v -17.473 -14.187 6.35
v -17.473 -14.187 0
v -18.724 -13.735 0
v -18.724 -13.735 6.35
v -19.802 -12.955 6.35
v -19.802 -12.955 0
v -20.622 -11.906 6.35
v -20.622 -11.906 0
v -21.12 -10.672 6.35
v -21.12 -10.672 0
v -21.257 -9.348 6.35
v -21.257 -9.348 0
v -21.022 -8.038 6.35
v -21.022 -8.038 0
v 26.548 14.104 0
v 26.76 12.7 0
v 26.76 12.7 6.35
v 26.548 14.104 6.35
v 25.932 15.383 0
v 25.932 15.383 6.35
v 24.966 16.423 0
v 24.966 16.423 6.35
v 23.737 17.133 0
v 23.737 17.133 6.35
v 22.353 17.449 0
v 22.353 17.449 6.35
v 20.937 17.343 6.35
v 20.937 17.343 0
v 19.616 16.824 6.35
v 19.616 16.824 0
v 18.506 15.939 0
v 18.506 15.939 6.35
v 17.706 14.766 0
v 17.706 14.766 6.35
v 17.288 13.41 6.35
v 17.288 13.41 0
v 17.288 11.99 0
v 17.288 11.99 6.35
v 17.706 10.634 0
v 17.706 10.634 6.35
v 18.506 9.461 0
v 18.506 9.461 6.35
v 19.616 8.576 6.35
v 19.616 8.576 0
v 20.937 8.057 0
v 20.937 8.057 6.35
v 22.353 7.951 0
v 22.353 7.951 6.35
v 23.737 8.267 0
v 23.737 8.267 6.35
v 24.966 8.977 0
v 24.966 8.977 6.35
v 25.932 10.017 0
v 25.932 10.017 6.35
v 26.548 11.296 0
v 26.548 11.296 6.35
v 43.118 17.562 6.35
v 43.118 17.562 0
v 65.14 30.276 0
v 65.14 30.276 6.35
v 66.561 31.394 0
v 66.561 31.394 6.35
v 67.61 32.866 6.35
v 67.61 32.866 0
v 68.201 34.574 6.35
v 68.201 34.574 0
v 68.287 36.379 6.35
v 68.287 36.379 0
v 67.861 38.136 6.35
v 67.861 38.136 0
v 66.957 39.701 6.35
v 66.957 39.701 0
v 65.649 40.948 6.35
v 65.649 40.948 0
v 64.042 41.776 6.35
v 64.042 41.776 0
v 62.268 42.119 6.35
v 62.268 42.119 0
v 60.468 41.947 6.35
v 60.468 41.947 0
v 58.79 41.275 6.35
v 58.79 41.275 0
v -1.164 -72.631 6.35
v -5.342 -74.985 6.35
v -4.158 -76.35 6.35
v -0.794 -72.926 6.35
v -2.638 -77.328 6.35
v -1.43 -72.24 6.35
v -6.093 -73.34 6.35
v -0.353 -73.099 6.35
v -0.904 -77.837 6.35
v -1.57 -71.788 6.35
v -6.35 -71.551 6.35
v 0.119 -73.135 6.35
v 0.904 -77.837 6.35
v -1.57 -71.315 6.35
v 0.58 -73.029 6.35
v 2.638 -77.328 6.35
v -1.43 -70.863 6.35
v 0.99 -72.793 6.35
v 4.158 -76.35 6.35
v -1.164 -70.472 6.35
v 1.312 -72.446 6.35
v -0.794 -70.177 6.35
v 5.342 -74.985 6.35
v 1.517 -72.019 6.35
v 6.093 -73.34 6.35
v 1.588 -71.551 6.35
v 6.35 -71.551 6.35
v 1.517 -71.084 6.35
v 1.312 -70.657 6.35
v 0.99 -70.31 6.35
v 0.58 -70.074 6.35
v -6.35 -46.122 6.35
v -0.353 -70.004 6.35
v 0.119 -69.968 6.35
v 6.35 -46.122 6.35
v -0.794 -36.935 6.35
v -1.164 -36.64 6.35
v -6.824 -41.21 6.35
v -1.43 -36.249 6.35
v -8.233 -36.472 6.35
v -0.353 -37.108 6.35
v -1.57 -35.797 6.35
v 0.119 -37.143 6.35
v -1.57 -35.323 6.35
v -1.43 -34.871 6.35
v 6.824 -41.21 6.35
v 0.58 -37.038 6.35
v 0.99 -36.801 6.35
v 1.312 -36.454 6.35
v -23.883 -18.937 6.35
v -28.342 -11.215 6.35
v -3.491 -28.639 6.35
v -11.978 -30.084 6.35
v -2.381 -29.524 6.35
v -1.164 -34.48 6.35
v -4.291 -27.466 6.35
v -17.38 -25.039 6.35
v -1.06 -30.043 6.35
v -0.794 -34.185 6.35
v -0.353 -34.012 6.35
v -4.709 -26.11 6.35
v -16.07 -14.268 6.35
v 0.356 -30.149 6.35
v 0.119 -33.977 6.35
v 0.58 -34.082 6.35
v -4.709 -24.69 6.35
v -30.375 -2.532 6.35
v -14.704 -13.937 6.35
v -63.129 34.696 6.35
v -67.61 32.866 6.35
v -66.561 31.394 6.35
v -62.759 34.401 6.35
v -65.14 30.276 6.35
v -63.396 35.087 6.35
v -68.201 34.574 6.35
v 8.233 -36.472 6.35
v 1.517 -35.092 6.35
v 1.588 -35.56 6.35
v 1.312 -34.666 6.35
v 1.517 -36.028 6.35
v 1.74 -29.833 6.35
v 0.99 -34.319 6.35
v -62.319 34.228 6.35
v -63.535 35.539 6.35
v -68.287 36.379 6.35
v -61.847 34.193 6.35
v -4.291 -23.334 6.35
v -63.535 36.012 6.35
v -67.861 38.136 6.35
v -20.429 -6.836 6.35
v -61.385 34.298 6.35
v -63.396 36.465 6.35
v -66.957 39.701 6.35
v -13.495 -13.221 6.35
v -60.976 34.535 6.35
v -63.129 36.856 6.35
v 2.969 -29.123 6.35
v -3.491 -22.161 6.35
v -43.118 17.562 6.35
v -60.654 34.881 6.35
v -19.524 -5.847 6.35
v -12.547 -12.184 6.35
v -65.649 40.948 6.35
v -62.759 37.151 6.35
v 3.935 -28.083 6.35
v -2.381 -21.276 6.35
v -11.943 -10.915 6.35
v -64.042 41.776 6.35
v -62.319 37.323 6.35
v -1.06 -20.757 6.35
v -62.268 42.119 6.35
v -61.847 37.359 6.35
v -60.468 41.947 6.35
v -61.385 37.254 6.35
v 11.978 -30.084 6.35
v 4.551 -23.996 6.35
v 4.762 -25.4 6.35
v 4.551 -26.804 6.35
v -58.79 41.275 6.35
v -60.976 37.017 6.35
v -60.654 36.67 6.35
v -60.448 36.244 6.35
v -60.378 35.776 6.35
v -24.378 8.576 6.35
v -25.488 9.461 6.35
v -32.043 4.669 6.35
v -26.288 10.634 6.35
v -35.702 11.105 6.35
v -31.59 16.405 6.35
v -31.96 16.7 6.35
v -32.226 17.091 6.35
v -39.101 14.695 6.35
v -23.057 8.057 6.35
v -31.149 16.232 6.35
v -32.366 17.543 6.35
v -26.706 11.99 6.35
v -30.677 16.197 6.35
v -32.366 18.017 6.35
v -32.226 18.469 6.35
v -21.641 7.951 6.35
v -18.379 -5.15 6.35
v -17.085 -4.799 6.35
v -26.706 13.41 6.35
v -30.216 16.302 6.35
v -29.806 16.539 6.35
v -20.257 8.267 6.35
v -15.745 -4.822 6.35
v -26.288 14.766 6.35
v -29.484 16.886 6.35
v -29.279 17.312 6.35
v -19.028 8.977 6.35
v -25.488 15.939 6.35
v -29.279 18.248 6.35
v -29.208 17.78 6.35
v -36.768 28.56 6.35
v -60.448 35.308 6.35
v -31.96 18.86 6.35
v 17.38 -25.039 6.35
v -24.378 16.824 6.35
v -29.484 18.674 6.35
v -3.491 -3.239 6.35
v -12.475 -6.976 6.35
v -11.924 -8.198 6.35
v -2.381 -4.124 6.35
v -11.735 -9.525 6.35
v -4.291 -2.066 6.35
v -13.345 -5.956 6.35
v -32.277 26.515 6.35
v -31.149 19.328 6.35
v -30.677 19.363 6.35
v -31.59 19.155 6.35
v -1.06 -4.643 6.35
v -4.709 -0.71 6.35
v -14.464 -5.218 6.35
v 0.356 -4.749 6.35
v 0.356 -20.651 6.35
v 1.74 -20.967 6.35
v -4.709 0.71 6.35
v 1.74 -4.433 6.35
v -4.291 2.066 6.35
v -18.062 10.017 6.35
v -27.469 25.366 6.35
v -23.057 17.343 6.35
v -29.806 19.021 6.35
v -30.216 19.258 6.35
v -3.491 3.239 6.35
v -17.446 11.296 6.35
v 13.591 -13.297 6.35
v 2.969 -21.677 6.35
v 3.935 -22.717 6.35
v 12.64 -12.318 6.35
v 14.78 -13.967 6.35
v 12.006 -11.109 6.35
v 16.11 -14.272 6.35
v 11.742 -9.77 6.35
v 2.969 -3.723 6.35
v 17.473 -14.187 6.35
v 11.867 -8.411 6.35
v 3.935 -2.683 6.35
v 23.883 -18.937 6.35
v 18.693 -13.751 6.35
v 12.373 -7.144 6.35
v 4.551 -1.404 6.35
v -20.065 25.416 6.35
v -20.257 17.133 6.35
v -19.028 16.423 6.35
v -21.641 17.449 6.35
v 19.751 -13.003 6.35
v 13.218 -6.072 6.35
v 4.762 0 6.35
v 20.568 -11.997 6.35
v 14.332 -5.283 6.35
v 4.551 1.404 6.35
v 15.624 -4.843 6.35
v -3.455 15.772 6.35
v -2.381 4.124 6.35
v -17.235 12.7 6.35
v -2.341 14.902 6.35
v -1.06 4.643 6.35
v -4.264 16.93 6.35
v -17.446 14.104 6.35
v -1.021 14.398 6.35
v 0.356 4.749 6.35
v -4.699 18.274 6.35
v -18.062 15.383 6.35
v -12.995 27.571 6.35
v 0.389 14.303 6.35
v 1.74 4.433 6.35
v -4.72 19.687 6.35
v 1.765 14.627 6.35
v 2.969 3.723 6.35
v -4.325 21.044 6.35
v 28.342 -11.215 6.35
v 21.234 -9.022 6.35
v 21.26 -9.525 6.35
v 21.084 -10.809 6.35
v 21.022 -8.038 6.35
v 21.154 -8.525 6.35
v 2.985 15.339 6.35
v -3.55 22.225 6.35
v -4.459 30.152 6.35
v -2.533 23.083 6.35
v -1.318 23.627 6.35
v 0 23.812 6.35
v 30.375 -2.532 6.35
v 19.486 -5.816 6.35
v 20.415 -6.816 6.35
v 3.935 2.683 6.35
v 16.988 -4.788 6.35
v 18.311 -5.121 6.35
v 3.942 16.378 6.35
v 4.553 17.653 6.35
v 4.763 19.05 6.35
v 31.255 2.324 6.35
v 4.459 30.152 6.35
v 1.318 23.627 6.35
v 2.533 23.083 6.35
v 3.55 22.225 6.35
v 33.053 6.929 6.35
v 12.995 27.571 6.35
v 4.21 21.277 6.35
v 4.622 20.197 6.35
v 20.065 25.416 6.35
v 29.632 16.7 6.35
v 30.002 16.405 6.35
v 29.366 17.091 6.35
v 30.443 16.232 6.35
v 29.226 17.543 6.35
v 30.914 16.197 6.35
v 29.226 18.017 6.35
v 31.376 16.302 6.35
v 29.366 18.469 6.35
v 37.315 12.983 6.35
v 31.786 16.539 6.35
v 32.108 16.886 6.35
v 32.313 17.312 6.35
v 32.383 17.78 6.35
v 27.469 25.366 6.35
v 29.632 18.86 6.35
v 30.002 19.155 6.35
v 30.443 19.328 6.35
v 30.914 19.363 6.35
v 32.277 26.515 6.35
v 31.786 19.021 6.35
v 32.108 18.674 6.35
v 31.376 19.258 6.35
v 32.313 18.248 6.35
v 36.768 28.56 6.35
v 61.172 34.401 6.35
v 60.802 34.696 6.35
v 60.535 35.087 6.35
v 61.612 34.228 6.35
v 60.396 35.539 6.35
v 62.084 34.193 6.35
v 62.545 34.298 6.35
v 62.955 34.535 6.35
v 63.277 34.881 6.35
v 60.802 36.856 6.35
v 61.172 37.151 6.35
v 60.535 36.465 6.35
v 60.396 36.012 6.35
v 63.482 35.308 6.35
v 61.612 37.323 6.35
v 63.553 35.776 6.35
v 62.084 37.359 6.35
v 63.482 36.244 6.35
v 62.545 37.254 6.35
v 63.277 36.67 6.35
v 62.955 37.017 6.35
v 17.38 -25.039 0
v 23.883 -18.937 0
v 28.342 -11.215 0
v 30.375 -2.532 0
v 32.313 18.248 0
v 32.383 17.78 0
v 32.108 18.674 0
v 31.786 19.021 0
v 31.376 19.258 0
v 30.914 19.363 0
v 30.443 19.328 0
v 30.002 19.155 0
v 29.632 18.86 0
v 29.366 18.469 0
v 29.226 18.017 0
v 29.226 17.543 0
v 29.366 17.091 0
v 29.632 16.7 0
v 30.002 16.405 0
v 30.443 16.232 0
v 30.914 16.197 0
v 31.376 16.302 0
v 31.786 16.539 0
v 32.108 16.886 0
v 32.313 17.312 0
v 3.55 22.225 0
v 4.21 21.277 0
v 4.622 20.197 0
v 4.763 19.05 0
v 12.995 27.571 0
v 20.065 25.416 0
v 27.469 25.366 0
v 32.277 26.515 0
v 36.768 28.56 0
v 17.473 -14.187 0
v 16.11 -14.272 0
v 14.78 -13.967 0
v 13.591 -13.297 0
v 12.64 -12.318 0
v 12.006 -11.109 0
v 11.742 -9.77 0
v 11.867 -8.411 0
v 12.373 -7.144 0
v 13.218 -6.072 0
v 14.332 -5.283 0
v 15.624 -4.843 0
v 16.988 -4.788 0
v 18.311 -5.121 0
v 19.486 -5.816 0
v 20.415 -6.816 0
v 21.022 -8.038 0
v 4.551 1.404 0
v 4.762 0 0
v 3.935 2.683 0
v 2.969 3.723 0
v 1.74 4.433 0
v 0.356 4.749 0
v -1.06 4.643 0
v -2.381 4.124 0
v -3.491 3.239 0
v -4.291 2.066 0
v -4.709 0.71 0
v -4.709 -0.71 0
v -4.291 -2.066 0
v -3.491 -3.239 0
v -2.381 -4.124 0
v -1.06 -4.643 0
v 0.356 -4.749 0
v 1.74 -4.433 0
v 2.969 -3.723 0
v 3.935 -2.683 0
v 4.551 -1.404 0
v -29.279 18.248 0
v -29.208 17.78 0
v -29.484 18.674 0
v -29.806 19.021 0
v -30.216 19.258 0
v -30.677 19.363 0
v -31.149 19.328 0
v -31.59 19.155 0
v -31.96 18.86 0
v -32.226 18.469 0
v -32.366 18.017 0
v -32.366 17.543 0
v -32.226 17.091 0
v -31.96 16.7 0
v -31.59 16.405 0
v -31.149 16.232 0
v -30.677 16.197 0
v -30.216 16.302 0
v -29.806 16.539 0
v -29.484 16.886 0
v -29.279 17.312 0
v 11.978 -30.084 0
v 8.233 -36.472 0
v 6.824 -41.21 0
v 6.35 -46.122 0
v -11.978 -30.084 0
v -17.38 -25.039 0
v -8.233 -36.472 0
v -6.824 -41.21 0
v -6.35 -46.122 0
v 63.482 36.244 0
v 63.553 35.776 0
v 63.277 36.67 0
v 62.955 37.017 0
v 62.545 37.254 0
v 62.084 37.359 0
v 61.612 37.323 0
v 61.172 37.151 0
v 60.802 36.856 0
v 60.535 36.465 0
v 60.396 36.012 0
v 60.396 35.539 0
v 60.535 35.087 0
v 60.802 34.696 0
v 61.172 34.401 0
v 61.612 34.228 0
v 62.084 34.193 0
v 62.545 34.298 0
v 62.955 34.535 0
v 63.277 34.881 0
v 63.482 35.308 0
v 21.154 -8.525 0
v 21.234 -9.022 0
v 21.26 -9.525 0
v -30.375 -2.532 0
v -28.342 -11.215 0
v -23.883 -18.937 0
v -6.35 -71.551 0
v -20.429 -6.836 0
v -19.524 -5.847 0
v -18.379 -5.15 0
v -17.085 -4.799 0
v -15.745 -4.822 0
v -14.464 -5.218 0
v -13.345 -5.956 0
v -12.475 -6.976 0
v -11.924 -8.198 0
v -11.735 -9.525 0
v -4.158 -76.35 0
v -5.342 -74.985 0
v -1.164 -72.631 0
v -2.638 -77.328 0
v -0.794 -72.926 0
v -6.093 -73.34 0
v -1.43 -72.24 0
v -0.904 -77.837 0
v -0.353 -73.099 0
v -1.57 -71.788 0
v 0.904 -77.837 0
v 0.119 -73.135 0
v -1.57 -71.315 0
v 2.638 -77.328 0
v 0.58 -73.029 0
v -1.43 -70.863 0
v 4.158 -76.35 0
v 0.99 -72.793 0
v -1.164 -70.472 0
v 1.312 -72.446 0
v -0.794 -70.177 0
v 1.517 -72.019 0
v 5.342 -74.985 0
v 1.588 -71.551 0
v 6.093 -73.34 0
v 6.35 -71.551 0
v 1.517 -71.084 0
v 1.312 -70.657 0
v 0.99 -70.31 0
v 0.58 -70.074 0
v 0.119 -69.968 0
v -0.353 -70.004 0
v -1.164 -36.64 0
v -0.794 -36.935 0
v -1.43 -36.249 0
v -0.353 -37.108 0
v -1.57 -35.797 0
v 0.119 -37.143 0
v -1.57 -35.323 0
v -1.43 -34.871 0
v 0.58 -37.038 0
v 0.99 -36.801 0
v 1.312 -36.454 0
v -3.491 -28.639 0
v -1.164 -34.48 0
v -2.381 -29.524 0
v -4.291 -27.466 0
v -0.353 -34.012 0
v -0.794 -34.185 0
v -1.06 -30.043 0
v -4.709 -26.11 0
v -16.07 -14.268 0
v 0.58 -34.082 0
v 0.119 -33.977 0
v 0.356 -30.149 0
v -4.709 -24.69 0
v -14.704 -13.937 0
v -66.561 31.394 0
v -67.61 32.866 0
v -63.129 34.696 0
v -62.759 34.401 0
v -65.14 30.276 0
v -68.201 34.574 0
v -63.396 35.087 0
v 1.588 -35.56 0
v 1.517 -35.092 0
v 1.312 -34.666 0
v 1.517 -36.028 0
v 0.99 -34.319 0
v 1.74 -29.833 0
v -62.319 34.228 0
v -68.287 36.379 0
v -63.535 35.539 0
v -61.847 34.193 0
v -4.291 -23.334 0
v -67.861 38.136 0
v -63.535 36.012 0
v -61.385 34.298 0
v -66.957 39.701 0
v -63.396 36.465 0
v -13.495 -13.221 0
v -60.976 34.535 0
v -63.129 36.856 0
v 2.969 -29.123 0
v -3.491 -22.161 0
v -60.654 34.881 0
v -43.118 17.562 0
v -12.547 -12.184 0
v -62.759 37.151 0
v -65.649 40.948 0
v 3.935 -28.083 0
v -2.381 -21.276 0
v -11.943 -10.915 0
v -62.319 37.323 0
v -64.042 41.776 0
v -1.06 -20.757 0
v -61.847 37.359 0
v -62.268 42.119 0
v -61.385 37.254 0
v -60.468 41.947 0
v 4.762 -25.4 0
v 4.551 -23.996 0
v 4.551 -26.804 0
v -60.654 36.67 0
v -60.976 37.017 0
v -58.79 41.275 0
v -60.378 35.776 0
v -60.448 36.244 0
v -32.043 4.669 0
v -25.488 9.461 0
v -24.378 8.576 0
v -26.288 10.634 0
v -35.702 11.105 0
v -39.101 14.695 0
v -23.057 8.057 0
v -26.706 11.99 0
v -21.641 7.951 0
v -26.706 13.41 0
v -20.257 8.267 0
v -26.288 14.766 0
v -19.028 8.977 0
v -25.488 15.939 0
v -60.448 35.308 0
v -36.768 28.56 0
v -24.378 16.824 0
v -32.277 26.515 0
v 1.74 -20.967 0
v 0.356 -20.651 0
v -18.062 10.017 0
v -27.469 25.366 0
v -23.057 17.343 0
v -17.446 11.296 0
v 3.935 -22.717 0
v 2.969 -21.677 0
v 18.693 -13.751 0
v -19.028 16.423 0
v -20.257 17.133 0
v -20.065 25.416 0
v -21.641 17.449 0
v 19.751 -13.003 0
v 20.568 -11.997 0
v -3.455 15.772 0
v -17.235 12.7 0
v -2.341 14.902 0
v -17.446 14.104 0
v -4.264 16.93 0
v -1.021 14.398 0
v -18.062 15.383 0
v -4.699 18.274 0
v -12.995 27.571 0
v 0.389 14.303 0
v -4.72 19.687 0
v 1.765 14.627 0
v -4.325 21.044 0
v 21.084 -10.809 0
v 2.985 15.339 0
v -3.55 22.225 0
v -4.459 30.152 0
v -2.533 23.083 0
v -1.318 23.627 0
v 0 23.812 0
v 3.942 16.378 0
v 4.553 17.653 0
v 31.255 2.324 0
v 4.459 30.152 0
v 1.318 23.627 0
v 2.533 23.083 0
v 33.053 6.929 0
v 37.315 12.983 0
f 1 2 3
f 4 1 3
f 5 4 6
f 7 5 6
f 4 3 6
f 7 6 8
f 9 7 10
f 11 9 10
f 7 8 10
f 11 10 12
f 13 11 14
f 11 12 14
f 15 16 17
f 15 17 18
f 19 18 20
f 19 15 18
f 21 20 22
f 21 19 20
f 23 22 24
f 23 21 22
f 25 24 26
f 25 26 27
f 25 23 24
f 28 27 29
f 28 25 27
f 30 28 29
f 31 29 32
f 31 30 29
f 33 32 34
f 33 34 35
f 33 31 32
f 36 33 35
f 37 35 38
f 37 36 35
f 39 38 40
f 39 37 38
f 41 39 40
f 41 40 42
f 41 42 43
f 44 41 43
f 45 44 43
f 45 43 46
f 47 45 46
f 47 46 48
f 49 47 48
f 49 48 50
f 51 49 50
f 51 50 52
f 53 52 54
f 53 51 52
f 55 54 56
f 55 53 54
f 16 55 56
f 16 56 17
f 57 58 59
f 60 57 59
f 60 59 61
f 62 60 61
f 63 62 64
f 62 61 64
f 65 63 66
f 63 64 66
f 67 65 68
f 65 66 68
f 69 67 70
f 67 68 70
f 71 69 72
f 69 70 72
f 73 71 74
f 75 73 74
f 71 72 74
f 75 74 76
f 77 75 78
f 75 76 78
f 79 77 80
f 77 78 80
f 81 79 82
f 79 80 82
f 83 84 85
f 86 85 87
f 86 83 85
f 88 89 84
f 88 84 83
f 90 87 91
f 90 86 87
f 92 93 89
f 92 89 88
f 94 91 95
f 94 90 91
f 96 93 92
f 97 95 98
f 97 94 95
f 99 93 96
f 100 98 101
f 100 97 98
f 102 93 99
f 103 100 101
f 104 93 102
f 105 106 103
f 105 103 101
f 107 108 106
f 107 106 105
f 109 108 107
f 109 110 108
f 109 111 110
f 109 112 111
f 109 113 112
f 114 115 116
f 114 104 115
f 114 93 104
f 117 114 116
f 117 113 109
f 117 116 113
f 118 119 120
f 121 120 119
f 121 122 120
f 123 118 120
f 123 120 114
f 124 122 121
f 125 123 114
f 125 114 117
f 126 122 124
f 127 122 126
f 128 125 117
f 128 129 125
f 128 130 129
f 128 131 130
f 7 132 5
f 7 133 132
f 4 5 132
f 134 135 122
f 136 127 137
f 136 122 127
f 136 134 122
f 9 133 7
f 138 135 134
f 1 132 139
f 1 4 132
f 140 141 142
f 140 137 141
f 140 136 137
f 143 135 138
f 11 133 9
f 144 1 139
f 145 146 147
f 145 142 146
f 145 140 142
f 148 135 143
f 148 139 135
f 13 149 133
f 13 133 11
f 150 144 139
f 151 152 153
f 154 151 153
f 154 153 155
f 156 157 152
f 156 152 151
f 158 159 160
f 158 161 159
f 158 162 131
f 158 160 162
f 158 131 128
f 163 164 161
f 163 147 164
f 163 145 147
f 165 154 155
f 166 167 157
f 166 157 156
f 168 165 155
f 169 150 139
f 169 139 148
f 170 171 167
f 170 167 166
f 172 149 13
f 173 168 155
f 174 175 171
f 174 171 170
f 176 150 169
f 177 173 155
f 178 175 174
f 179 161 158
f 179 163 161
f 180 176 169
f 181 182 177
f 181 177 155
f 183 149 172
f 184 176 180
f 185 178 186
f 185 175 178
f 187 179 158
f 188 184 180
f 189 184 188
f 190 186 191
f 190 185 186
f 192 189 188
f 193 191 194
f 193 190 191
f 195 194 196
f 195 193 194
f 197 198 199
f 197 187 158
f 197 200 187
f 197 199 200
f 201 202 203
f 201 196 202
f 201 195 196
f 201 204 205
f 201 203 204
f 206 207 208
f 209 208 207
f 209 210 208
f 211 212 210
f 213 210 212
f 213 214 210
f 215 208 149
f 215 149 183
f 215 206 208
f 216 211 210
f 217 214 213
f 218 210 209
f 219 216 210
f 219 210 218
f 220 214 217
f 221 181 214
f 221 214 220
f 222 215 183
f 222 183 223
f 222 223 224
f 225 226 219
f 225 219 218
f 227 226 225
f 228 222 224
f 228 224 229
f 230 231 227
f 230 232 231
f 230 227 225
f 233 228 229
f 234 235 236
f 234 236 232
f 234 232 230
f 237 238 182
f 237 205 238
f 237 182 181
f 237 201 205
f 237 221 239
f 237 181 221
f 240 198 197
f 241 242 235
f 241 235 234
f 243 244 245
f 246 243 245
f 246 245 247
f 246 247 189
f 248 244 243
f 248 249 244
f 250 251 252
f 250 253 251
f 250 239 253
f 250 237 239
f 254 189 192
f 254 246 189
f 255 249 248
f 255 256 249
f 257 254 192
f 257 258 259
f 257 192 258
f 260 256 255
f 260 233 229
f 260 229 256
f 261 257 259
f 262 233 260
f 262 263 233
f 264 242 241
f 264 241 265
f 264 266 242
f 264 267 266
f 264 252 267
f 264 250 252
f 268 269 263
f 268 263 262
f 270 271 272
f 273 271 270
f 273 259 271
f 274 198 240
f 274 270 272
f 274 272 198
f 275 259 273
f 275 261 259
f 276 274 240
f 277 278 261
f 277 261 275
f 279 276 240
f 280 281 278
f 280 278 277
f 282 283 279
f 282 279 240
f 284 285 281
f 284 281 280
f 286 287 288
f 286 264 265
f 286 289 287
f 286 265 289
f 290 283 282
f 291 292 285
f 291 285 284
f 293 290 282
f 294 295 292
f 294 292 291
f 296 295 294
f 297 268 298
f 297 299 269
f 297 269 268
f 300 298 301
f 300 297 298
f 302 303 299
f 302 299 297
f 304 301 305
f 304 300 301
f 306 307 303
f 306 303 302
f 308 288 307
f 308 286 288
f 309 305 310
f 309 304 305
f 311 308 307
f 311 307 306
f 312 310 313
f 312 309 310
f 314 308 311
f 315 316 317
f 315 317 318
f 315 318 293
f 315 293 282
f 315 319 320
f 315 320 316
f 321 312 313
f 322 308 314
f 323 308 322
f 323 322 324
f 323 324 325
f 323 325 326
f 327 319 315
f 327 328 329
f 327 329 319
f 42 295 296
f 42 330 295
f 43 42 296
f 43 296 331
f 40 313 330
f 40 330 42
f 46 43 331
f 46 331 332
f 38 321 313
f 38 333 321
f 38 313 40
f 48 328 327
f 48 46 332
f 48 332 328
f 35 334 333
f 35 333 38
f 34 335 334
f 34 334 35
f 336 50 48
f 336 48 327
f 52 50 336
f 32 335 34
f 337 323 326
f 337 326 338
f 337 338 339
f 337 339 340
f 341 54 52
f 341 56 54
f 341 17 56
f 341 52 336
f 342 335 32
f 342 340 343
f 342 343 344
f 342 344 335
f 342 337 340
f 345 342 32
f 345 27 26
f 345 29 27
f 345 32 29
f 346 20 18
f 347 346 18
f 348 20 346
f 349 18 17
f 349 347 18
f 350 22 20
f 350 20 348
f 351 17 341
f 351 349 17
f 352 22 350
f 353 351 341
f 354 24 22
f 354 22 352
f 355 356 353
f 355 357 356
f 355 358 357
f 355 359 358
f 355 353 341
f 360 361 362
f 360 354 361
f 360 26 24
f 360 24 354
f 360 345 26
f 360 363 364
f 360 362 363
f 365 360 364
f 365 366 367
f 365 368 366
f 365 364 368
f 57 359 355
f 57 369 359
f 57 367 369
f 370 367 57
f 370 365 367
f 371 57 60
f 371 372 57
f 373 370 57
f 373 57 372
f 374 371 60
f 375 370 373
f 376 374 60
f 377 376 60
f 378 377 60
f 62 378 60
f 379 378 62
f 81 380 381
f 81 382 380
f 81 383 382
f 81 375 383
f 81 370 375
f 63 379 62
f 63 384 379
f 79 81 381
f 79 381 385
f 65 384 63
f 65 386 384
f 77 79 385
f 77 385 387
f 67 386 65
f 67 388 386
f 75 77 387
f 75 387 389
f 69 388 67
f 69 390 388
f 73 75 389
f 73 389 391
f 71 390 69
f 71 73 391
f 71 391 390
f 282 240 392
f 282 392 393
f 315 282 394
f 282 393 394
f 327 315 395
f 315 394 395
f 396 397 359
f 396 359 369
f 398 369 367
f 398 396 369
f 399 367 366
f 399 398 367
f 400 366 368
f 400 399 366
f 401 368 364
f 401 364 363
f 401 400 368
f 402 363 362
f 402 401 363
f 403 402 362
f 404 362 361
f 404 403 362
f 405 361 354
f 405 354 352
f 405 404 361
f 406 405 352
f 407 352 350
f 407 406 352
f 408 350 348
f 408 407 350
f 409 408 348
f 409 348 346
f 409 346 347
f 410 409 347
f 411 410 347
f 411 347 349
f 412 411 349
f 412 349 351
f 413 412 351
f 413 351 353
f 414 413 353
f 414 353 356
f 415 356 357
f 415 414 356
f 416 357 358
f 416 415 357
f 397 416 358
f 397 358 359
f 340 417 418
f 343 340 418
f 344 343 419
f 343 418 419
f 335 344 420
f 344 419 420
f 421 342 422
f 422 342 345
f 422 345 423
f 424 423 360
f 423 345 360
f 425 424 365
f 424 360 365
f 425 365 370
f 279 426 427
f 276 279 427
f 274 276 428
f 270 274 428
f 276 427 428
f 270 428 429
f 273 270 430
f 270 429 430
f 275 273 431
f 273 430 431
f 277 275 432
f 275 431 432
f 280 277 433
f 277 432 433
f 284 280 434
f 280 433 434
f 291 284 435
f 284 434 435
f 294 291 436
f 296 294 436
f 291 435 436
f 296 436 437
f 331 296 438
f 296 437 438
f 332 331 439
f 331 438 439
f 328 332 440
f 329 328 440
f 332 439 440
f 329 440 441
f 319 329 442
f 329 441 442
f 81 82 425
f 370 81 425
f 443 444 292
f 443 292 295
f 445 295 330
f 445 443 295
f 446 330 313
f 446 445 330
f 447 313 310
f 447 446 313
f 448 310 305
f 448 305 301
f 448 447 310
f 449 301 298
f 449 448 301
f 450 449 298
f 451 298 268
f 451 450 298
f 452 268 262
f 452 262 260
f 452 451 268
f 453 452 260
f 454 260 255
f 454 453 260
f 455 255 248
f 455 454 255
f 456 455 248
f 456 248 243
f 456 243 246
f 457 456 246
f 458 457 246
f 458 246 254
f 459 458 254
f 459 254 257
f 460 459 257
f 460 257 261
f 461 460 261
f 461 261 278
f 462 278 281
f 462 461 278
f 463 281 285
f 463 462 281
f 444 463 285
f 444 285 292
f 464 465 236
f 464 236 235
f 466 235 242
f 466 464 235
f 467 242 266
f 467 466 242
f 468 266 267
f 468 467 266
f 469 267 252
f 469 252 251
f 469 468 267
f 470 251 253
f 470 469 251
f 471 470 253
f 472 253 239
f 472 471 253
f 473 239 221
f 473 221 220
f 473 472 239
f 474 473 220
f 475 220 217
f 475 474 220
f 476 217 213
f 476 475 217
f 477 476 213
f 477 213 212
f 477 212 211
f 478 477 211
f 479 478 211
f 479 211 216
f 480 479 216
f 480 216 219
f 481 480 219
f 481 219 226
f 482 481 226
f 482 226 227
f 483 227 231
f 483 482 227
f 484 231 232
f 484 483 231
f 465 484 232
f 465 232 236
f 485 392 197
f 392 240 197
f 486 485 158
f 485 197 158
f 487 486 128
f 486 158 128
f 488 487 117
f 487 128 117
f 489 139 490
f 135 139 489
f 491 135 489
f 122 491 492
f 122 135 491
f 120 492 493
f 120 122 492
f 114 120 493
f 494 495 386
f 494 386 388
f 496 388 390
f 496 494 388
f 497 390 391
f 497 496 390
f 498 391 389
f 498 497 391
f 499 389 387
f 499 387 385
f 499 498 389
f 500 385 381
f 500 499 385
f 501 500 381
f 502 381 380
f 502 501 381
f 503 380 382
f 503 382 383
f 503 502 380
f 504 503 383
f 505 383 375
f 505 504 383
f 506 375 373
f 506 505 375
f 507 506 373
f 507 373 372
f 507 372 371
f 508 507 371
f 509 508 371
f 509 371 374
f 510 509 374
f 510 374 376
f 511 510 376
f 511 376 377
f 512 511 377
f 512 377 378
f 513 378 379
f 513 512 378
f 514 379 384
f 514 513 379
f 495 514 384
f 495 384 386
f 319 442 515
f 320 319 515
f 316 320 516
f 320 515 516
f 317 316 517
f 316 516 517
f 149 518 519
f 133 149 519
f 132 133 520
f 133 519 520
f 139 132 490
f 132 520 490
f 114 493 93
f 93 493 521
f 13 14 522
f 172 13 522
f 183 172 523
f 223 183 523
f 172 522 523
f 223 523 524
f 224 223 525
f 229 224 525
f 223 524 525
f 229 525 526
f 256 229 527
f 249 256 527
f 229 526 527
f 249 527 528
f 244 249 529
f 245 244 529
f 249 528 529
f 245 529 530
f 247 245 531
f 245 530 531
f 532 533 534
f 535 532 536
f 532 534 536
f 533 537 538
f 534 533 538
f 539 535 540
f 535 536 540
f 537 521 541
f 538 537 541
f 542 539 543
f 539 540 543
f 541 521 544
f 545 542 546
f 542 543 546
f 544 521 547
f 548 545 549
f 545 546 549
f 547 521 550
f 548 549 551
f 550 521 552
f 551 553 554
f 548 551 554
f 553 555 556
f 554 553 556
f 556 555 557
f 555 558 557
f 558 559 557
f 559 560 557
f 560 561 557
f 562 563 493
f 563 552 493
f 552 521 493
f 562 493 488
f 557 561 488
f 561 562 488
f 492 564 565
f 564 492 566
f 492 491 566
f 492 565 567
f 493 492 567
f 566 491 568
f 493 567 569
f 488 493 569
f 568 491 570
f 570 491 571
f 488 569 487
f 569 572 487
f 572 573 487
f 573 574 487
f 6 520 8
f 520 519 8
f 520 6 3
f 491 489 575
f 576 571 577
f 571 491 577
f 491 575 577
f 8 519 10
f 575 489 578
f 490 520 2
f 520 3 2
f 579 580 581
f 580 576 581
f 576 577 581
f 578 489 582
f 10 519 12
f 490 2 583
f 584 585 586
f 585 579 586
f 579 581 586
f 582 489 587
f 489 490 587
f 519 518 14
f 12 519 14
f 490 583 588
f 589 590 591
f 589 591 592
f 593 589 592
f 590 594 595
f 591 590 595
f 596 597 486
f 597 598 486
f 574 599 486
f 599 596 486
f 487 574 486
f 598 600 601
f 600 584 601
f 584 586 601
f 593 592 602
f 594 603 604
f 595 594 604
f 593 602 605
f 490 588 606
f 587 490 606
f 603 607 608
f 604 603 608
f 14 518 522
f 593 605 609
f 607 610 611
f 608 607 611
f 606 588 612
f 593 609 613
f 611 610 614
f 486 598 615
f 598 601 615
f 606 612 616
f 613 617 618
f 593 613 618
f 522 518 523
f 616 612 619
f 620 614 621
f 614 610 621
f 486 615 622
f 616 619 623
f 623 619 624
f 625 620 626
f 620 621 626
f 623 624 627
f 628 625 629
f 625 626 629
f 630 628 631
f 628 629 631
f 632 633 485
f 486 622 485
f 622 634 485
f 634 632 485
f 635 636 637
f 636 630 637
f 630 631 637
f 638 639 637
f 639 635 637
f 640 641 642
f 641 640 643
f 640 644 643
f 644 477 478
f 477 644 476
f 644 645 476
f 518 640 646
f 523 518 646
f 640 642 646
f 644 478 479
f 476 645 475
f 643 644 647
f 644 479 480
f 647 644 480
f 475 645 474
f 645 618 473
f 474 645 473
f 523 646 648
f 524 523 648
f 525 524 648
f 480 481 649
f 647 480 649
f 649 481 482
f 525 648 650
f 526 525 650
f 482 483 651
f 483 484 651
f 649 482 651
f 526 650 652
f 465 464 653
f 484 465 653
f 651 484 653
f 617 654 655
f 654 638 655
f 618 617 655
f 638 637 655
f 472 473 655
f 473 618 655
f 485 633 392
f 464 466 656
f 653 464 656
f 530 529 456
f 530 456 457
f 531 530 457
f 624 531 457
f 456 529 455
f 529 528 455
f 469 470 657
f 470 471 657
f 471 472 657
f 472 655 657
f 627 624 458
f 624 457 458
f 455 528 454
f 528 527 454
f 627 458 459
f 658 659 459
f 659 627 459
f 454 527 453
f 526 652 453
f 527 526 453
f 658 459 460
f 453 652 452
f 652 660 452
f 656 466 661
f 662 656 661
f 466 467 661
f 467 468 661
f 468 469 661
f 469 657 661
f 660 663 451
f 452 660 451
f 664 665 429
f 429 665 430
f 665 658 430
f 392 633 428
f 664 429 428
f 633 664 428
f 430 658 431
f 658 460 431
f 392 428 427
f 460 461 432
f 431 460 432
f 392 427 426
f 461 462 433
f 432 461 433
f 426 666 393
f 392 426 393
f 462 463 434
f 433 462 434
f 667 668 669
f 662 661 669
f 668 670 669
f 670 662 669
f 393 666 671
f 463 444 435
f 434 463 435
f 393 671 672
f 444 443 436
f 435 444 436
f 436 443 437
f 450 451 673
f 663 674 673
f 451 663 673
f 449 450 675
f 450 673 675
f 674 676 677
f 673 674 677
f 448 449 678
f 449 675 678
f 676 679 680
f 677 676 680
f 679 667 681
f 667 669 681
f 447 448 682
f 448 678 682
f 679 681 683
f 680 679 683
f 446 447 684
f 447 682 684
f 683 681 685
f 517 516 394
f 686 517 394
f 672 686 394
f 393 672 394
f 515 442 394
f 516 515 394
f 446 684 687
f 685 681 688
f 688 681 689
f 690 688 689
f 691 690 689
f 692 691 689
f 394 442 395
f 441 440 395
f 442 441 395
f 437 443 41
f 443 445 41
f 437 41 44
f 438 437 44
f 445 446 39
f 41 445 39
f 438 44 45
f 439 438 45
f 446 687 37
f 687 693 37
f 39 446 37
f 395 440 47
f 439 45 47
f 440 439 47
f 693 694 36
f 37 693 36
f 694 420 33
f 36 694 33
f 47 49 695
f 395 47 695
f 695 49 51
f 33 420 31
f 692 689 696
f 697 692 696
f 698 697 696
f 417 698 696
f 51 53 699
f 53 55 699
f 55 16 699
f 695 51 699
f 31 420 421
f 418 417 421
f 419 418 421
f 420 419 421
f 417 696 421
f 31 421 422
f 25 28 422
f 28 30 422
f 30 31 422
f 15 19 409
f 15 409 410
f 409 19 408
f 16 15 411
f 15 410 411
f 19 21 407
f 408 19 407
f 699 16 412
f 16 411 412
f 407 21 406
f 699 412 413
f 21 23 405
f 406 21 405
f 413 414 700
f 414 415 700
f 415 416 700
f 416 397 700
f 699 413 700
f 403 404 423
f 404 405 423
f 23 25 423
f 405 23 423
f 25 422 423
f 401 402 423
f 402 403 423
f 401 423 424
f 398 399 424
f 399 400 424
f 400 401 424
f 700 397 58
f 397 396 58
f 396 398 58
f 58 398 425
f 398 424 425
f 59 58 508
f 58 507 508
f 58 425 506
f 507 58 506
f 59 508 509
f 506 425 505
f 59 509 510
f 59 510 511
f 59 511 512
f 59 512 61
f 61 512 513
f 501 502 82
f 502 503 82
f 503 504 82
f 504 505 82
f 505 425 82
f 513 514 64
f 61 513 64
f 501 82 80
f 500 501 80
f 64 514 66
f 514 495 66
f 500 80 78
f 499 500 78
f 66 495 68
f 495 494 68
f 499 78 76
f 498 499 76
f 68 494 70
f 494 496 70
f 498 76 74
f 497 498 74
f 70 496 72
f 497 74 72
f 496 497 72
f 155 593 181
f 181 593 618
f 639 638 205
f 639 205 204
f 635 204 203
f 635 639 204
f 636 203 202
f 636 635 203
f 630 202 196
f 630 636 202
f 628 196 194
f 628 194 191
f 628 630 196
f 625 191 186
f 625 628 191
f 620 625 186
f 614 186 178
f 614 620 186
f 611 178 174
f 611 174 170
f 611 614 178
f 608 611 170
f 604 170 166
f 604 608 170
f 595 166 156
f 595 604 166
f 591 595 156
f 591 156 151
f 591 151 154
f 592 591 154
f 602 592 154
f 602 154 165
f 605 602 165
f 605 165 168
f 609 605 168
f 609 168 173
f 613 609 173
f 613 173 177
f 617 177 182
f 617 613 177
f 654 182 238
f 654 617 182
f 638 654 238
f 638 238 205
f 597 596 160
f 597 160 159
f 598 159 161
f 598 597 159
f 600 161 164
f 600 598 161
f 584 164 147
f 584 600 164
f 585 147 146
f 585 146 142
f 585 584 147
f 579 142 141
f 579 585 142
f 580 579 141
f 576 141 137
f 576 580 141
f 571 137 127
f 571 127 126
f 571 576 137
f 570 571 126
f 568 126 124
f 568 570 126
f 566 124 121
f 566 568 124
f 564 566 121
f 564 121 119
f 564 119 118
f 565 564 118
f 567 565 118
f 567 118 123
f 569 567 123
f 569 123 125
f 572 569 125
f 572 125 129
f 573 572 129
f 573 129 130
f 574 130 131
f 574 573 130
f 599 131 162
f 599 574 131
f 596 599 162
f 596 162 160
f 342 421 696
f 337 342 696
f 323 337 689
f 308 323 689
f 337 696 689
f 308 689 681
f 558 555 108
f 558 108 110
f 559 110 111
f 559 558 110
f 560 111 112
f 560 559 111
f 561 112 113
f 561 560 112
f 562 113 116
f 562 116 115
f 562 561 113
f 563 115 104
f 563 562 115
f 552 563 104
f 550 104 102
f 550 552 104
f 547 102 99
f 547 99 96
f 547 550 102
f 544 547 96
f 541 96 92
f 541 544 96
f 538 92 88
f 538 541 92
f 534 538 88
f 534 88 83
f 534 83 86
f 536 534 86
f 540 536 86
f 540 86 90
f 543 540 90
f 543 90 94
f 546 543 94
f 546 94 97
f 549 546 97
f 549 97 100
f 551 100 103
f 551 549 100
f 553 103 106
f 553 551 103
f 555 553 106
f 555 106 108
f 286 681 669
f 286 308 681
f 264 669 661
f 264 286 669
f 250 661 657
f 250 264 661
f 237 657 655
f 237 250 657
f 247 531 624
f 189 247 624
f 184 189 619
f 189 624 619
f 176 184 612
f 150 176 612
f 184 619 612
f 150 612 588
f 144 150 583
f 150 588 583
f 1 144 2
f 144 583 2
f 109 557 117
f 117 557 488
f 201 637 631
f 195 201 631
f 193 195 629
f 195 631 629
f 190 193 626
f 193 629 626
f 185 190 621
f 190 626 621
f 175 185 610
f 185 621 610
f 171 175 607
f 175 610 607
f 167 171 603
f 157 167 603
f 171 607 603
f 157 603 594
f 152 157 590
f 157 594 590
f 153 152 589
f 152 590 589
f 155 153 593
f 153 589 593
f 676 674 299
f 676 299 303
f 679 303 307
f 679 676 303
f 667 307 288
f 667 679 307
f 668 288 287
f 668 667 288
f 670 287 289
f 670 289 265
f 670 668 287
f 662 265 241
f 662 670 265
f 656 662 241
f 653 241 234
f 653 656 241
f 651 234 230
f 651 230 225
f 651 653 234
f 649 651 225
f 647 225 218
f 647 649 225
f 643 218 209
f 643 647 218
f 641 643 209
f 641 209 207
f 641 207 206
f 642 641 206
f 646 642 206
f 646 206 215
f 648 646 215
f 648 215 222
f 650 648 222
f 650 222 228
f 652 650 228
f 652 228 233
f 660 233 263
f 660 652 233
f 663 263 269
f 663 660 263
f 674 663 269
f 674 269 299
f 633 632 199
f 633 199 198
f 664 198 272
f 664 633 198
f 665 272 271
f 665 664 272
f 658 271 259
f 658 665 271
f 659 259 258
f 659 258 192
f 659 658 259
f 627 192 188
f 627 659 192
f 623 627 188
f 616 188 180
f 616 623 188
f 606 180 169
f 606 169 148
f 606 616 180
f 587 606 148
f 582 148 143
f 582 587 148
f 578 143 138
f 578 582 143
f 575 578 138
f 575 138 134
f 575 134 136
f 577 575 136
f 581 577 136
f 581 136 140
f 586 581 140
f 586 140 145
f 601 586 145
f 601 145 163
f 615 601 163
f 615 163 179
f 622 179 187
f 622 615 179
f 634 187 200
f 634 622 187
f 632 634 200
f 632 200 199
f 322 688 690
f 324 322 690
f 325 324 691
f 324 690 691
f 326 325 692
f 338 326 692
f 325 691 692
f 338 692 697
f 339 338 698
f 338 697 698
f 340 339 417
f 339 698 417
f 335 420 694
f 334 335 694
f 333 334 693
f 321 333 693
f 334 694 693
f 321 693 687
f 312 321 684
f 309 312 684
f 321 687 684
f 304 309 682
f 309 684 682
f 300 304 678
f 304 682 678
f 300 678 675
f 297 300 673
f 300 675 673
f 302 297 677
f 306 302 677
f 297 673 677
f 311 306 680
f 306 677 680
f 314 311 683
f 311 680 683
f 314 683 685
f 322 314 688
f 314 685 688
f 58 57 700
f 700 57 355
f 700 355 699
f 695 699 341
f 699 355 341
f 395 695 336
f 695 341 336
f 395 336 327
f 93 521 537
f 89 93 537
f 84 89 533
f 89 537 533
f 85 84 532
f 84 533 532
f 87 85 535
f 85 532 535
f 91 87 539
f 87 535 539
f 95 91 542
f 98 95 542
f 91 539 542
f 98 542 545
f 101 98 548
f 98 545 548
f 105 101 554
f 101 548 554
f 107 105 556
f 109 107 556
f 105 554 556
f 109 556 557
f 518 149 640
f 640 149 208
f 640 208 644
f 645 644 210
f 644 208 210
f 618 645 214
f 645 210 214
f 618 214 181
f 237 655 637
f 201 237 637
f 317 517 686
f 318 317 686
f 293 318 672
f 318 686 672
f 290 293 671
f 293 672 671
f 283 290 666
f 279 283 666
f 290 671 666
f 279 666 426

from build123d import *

# Parameters (mm, degrees)
F0_R        = 1.5875
F0_R_2      = 4.7625
F1_DEPTH    = 6.35
F2_T1_DEPTH = 6.35
F3_R        = 25.6632962838


# Not quite as in the source:
# - a fillet or chamfer that OpenCascade refuses, or shapes differently, is made with other operations: its cross-section is extruded or revolved along the edge and cut away or added
# - a length typed as a fraction of an inch, garbled in the dataset ("3 / 203.2 mm" for 3/8 in), is restored


with BuildPart() as f1:
    # F0 (on Top) → F1 (new body)
    with BuildSketch(Plane.XY):
        with BuildLine():
            Line((25.7948291982, 22.225), (38.4948291982, 22.225))
            Line((38.4948291982, 22.225), (32.1448291982, 11.2264773719))
            Line((32.1448291982, 11.2264773719), (65.1403970824, 30.2764773719))
            ThreePointArc((65.1403970824, 30.2764773719), (67.4646583964, 38.950738686), (58.7903970824, 41.275))
            Line((58.7903970824, 41.275), (25.7948291982, 22.225))
        make_face()
        with Locations((61.9653970824, 35.775738686)):
            Circle(F0_R, mode=Mode.SUBTRACT)
        with BuildLine():
            Line((32.1448291982, 11.2264773719), (38.4948291982, 22.225))
            Line((38.4948291982, 22.225), (25.7948291982, 22.225))
            Line((25.7948291982, 22.225), (20.8585659862, 22.225))
            ThreePointArc((20.8585659862, 22.225), (26.3964543073, 15.24), (29.6766975922, 6.9515480306))
            Line((29.6766975922, 6.9515480306), (32.1448291982, 11.2264773719))
        make_face()
        with Locations((30.7958633586, 17.78)):
            Circle(F0_R, mode=Mode.SUBTRACT)
        with BuildLine():
            ThreePointArc((30.48, 0), (30.2785084062, 3.4989039276), (29.6766975922, 6.9515480306))
            Line((29.6766975922, 6.9515480306), (21.0222935562, -8.0383194689))
            ThreePointArc((21.0222935562, -8.0383194689), (21.2004099791, -8.7721955059), (21.2602839421, -9.525))
            ThreePointArc((21.2602839421, -9.525), (20.1939753076, -12.5282608344), (17.472535642, -14.1866805311))
            Line((17.472535642, -14.1866805311), (8.818131606, -29.1765480305))
            ThreePointArc((8.818131606, -29.1765480305), (24.4725055047, -18.1693938898), (30.48, 0))
        make_face()
        with BuildLine():
            Line((21.0222935562, -8.0383194689), (29.6766975922, 6.9515480306))
            ThreePointArc((29.6766975922, 6.9515480306), (26.3964543073, 15.24), (20.8585659862, 22.225))
            Line((20.8585659862, 22.225), (3.5497579143, 22.225))
            ThreePointArc((3.5497579143, 22.225), (4.4489958596, 20.7493652025), (4.7625, 19.05))
            ThreePointArc((4.7625, 19.05), (-1.6993652025, 14.6010041404), (-3.5497579143, 22.225))
            Line((-3.5497579143, 22.225), (-20.8585659862, 22.225))
            ThreePointArc((-20.8585659862, 22.225), (-26.3964543073, 15.24), (-29.6766975922, 6.9515480306))
            Line((-29.6766975922, 6.9515480306), (-21.0222935562, -8.0383194689))
            ThreePointArc((-21.0222935562, -8.0383194689), (-15.744979448, -4.822373963), (-11.7352839421, -9.525))
            ThreePointArc((-11.7352839421, -9.525), (-13.4945231077, -13.2211913655), (-17.472535642, -14.1866805311))
            Line((-17.472535642, -14.1866805311), (-8.818131606, -29.1765480305))
            ThreePointArc((-8.818131606, -29.1765480305), (0, -30.48), (8.818131606, -29.1765480305))
            Line((8.818131606, -29.1765480305), (17.472535642, -14.1866805311))
            ThreePointArc((17.472535642, -14.1866805311), (12.3733379566, -7.14375), (21.0222935562, -8.0383194689))
        make_face()
        with Locations((0, -25.4)):
            Circle(F0_R_2, mode=Mode.SUBTRACT)
        with Locations((-21.9970452561, 12.7)):
            Circle(F0_R_2, mode=Mode.SUBTRACT)
        Circle(F0_R_2, mode=Mode.SUBTRACT)
        with Locations((21.9970452561, 12.7)):
            Circle(F0_R_2, mode=Mode.SUBTRACT)
        with BuildLine():
            Line((3.5497579143, 22.225), (20.8585659862, 22.225))
            ThreePointArc((20.8585659862, 22.225), (0, 30.48), (-20.8585659862, 22.225))
            Line((-20.8585659862, 22.225), (-3.5497579143, 22.225))
            ThreePointArc((-3.5497579143, 22.225), (0, 23.8125), (3.5497579143, 22.225))
        make_face()
        with BuildLine():
            ThreePointArc((-29.6766975922, 6.9515480306), (-26.3964543073, 15.24), (-20.8585659862, 22.225))
            Line((-20.8585659862, 22.225), (-25.7948291982, 22.225))
            Line((-25.7948291982, 22.225), (-38.4948291982, 22.225))
            Line((-38.4948291982, 22.225), (-32.1448291982, 11.2264773719))
            Line((-32.1448291982, 11.2264773719), (-29.6766975922, 6.9515480306))
        make_face()
        with Locations((-30.7958633586, 17.78)):
            Circle(F0_R, mode=Mode.SUBTRACT)
        with BuildLine():
            Line((6.35, -33.4514773719), (8.818131606, -29.1765480305))
            ThreePointArc((8.818131606, -29.1765480305), (0, -30.48), (-8.818131606, -29.1765480305))
            Line((-8.818131606, -29.1765480305), (-6.35, -33.4514773719))
            Line((-6.35, -33.4514773719), (0, -44.45))
            Line((0, -44.45), (6.35, -33.4514773719))
        make_face()
        with Locations((0, -35.56)):
            Circle(F0_R, mode=Mode.SUBTRACT)
        with BuildLine():
            Line((-38.4948291982, 22.225), (-25.7948291982, 22.225))
            Line((-25.7948291982, 22.225), (-58.7903970824, 41.275))
            ThreePointArc((-58.7903970824, 41.275), (-67.4646583964, 38.950738686), (-65.1403970824, 30.2764773719))
            Line((-65.1403970824, 30.2764773719), (-32.1448291982, 11.2264773719))
            Line((-32.1448291982, 11.2264773719), (-38.4948291982, 22.225))
        make_face()
        with Locations((-61.9653970824, 35.775738686)):
            Circle(F0_R, mode=Mode.SUBTRACT)
        with BuildLine():
            Line((-21.0222935562, -8.0383194689), (-29.6766975922, 6.9515480306))
            ThreePointArc((-29.6766975922, 6.9515480306), (-26.3964543073, -15.24), (-8.818131606, -29.1765480305))
            Line((-8.818131606, -29.1765480305), (-17.472535642, -14.1866805311))
            ThreePointArc((-17.472535642, -14.1866805311), (-20.6222299276, -11.90625), (-21.0222935562, -8.0383194689))
        make_face()
        with BuildLine():
            Line((6.35, -71.5514773719), (6.35, -33.4514773719))
            Line((6.35, -33.4514773719), (0, -44.45))
            Line((0, -44.45), (-6.35, -33.4514773719))
            Line((-6.35, -33.4514773719), (-6.35, -71.5514773719))
            ThreePointArc((-6.35, -71.5514773719), (0, -77.9014773719), (6.35, -71.5514773719))
        make_face()
        with Locations((0, -71.5514773719)):
            Circle(F0_R, mode=Mode.SUBTRACT)
    extrude(amount=F1_DEPTH)

    # F2: fillet of radius 50.8 on 6 edges, made by hand

    # F2_s2 → F2_t1 (join)
    with BuildSketch(Plane.XY):
        with BuildLine():
            ThreePointArc((29.6766975922, 6.9515480306), (35.4424077678, 12.4134665997), (41.9889550232, 16.9099860669))
            Line((41.9889550232, 16.9099860669), (32.1448291982, 11.2264773719))
            Line((32.1448291982, 11.2264773719), (29.6766975922, 6.9515480306))
        make_face()
        with BuildLine():
            ThreePointArc((35.6389550232, 27.908508695), (28.4715813083, 24.4872921983), (20.8585659862, 22.225))
            Line((20.8585659862, 22.225), (25.7948291982, 22.225))
            Line((25.7948291982, 22.225), (35.6389550232, 27.908508695))
        make_face()
        with BuildLine():
            ThreePointArc((-20.8585659862, 22.225), (-28.4715813083, 24.4872921983), (-35.6389550232, 27.908508695))
            Line((-35.6389550232, 27.908508695), (-25.7948291982, 22.225))
            Line((-25.7948291982, 22.225), (-20.8585659862, 22.225))
        make_face()
        with BuildLine():
            ThreePointArc((-41.9889550232, 16.9099860669), (-35.4424077678, 12.4134665997), (-29.6766975922, 6.9515480306))
            Line((-29.6766975922, 6.9515480306), (-32.1448291982, 11.2264773719))
            Line((-32.1448291982, 11.2264773719), (-41.9889550232, 16.9099860669))
        make_face()
        with BuildLine():
            ThreePointArc((-8.818131606, -29.1765480305), (-6.9708264595, -36.9007587981), (-6.35, -44.8184947619))
            Line((-6.35, -44.8184947619), (-6.35, -33.4514773719))
            Line((-6.35, -33.4514773719), (-8.818131606, -29.1765480305))
        make_face()
        with BuildLine():
            ThreePointArc((6.35, -44.8184947619), (6.9708264595, -36.9007587981), (8.818131606, -29.1765480305))
            Line((8.818131606, -29.1765480305), (6.35, -33.4514773719))
            Line((6.35, -33.4514773719), (6.35, -44.8184947619))
        make_face()
    extrude(amount=F2_T1_DEPTH)

    # F3
    f3_edges = [f1.edges().sort_by_distance(p)[0] for p in [
        (-29.676698, 6.951548, 3.175),
        (-8.818132, -29.176548, 3.175),
        (8.818132, -29.176548, 3.175),
        (29.676698, 6.951548, 3.175),
        (20.858566, 22.225, 3.175),
        (-20.858566, 22.225, 3.175),
    ]]
    fillet(f3_edges, radius=F3_R)


solid = f1.part
